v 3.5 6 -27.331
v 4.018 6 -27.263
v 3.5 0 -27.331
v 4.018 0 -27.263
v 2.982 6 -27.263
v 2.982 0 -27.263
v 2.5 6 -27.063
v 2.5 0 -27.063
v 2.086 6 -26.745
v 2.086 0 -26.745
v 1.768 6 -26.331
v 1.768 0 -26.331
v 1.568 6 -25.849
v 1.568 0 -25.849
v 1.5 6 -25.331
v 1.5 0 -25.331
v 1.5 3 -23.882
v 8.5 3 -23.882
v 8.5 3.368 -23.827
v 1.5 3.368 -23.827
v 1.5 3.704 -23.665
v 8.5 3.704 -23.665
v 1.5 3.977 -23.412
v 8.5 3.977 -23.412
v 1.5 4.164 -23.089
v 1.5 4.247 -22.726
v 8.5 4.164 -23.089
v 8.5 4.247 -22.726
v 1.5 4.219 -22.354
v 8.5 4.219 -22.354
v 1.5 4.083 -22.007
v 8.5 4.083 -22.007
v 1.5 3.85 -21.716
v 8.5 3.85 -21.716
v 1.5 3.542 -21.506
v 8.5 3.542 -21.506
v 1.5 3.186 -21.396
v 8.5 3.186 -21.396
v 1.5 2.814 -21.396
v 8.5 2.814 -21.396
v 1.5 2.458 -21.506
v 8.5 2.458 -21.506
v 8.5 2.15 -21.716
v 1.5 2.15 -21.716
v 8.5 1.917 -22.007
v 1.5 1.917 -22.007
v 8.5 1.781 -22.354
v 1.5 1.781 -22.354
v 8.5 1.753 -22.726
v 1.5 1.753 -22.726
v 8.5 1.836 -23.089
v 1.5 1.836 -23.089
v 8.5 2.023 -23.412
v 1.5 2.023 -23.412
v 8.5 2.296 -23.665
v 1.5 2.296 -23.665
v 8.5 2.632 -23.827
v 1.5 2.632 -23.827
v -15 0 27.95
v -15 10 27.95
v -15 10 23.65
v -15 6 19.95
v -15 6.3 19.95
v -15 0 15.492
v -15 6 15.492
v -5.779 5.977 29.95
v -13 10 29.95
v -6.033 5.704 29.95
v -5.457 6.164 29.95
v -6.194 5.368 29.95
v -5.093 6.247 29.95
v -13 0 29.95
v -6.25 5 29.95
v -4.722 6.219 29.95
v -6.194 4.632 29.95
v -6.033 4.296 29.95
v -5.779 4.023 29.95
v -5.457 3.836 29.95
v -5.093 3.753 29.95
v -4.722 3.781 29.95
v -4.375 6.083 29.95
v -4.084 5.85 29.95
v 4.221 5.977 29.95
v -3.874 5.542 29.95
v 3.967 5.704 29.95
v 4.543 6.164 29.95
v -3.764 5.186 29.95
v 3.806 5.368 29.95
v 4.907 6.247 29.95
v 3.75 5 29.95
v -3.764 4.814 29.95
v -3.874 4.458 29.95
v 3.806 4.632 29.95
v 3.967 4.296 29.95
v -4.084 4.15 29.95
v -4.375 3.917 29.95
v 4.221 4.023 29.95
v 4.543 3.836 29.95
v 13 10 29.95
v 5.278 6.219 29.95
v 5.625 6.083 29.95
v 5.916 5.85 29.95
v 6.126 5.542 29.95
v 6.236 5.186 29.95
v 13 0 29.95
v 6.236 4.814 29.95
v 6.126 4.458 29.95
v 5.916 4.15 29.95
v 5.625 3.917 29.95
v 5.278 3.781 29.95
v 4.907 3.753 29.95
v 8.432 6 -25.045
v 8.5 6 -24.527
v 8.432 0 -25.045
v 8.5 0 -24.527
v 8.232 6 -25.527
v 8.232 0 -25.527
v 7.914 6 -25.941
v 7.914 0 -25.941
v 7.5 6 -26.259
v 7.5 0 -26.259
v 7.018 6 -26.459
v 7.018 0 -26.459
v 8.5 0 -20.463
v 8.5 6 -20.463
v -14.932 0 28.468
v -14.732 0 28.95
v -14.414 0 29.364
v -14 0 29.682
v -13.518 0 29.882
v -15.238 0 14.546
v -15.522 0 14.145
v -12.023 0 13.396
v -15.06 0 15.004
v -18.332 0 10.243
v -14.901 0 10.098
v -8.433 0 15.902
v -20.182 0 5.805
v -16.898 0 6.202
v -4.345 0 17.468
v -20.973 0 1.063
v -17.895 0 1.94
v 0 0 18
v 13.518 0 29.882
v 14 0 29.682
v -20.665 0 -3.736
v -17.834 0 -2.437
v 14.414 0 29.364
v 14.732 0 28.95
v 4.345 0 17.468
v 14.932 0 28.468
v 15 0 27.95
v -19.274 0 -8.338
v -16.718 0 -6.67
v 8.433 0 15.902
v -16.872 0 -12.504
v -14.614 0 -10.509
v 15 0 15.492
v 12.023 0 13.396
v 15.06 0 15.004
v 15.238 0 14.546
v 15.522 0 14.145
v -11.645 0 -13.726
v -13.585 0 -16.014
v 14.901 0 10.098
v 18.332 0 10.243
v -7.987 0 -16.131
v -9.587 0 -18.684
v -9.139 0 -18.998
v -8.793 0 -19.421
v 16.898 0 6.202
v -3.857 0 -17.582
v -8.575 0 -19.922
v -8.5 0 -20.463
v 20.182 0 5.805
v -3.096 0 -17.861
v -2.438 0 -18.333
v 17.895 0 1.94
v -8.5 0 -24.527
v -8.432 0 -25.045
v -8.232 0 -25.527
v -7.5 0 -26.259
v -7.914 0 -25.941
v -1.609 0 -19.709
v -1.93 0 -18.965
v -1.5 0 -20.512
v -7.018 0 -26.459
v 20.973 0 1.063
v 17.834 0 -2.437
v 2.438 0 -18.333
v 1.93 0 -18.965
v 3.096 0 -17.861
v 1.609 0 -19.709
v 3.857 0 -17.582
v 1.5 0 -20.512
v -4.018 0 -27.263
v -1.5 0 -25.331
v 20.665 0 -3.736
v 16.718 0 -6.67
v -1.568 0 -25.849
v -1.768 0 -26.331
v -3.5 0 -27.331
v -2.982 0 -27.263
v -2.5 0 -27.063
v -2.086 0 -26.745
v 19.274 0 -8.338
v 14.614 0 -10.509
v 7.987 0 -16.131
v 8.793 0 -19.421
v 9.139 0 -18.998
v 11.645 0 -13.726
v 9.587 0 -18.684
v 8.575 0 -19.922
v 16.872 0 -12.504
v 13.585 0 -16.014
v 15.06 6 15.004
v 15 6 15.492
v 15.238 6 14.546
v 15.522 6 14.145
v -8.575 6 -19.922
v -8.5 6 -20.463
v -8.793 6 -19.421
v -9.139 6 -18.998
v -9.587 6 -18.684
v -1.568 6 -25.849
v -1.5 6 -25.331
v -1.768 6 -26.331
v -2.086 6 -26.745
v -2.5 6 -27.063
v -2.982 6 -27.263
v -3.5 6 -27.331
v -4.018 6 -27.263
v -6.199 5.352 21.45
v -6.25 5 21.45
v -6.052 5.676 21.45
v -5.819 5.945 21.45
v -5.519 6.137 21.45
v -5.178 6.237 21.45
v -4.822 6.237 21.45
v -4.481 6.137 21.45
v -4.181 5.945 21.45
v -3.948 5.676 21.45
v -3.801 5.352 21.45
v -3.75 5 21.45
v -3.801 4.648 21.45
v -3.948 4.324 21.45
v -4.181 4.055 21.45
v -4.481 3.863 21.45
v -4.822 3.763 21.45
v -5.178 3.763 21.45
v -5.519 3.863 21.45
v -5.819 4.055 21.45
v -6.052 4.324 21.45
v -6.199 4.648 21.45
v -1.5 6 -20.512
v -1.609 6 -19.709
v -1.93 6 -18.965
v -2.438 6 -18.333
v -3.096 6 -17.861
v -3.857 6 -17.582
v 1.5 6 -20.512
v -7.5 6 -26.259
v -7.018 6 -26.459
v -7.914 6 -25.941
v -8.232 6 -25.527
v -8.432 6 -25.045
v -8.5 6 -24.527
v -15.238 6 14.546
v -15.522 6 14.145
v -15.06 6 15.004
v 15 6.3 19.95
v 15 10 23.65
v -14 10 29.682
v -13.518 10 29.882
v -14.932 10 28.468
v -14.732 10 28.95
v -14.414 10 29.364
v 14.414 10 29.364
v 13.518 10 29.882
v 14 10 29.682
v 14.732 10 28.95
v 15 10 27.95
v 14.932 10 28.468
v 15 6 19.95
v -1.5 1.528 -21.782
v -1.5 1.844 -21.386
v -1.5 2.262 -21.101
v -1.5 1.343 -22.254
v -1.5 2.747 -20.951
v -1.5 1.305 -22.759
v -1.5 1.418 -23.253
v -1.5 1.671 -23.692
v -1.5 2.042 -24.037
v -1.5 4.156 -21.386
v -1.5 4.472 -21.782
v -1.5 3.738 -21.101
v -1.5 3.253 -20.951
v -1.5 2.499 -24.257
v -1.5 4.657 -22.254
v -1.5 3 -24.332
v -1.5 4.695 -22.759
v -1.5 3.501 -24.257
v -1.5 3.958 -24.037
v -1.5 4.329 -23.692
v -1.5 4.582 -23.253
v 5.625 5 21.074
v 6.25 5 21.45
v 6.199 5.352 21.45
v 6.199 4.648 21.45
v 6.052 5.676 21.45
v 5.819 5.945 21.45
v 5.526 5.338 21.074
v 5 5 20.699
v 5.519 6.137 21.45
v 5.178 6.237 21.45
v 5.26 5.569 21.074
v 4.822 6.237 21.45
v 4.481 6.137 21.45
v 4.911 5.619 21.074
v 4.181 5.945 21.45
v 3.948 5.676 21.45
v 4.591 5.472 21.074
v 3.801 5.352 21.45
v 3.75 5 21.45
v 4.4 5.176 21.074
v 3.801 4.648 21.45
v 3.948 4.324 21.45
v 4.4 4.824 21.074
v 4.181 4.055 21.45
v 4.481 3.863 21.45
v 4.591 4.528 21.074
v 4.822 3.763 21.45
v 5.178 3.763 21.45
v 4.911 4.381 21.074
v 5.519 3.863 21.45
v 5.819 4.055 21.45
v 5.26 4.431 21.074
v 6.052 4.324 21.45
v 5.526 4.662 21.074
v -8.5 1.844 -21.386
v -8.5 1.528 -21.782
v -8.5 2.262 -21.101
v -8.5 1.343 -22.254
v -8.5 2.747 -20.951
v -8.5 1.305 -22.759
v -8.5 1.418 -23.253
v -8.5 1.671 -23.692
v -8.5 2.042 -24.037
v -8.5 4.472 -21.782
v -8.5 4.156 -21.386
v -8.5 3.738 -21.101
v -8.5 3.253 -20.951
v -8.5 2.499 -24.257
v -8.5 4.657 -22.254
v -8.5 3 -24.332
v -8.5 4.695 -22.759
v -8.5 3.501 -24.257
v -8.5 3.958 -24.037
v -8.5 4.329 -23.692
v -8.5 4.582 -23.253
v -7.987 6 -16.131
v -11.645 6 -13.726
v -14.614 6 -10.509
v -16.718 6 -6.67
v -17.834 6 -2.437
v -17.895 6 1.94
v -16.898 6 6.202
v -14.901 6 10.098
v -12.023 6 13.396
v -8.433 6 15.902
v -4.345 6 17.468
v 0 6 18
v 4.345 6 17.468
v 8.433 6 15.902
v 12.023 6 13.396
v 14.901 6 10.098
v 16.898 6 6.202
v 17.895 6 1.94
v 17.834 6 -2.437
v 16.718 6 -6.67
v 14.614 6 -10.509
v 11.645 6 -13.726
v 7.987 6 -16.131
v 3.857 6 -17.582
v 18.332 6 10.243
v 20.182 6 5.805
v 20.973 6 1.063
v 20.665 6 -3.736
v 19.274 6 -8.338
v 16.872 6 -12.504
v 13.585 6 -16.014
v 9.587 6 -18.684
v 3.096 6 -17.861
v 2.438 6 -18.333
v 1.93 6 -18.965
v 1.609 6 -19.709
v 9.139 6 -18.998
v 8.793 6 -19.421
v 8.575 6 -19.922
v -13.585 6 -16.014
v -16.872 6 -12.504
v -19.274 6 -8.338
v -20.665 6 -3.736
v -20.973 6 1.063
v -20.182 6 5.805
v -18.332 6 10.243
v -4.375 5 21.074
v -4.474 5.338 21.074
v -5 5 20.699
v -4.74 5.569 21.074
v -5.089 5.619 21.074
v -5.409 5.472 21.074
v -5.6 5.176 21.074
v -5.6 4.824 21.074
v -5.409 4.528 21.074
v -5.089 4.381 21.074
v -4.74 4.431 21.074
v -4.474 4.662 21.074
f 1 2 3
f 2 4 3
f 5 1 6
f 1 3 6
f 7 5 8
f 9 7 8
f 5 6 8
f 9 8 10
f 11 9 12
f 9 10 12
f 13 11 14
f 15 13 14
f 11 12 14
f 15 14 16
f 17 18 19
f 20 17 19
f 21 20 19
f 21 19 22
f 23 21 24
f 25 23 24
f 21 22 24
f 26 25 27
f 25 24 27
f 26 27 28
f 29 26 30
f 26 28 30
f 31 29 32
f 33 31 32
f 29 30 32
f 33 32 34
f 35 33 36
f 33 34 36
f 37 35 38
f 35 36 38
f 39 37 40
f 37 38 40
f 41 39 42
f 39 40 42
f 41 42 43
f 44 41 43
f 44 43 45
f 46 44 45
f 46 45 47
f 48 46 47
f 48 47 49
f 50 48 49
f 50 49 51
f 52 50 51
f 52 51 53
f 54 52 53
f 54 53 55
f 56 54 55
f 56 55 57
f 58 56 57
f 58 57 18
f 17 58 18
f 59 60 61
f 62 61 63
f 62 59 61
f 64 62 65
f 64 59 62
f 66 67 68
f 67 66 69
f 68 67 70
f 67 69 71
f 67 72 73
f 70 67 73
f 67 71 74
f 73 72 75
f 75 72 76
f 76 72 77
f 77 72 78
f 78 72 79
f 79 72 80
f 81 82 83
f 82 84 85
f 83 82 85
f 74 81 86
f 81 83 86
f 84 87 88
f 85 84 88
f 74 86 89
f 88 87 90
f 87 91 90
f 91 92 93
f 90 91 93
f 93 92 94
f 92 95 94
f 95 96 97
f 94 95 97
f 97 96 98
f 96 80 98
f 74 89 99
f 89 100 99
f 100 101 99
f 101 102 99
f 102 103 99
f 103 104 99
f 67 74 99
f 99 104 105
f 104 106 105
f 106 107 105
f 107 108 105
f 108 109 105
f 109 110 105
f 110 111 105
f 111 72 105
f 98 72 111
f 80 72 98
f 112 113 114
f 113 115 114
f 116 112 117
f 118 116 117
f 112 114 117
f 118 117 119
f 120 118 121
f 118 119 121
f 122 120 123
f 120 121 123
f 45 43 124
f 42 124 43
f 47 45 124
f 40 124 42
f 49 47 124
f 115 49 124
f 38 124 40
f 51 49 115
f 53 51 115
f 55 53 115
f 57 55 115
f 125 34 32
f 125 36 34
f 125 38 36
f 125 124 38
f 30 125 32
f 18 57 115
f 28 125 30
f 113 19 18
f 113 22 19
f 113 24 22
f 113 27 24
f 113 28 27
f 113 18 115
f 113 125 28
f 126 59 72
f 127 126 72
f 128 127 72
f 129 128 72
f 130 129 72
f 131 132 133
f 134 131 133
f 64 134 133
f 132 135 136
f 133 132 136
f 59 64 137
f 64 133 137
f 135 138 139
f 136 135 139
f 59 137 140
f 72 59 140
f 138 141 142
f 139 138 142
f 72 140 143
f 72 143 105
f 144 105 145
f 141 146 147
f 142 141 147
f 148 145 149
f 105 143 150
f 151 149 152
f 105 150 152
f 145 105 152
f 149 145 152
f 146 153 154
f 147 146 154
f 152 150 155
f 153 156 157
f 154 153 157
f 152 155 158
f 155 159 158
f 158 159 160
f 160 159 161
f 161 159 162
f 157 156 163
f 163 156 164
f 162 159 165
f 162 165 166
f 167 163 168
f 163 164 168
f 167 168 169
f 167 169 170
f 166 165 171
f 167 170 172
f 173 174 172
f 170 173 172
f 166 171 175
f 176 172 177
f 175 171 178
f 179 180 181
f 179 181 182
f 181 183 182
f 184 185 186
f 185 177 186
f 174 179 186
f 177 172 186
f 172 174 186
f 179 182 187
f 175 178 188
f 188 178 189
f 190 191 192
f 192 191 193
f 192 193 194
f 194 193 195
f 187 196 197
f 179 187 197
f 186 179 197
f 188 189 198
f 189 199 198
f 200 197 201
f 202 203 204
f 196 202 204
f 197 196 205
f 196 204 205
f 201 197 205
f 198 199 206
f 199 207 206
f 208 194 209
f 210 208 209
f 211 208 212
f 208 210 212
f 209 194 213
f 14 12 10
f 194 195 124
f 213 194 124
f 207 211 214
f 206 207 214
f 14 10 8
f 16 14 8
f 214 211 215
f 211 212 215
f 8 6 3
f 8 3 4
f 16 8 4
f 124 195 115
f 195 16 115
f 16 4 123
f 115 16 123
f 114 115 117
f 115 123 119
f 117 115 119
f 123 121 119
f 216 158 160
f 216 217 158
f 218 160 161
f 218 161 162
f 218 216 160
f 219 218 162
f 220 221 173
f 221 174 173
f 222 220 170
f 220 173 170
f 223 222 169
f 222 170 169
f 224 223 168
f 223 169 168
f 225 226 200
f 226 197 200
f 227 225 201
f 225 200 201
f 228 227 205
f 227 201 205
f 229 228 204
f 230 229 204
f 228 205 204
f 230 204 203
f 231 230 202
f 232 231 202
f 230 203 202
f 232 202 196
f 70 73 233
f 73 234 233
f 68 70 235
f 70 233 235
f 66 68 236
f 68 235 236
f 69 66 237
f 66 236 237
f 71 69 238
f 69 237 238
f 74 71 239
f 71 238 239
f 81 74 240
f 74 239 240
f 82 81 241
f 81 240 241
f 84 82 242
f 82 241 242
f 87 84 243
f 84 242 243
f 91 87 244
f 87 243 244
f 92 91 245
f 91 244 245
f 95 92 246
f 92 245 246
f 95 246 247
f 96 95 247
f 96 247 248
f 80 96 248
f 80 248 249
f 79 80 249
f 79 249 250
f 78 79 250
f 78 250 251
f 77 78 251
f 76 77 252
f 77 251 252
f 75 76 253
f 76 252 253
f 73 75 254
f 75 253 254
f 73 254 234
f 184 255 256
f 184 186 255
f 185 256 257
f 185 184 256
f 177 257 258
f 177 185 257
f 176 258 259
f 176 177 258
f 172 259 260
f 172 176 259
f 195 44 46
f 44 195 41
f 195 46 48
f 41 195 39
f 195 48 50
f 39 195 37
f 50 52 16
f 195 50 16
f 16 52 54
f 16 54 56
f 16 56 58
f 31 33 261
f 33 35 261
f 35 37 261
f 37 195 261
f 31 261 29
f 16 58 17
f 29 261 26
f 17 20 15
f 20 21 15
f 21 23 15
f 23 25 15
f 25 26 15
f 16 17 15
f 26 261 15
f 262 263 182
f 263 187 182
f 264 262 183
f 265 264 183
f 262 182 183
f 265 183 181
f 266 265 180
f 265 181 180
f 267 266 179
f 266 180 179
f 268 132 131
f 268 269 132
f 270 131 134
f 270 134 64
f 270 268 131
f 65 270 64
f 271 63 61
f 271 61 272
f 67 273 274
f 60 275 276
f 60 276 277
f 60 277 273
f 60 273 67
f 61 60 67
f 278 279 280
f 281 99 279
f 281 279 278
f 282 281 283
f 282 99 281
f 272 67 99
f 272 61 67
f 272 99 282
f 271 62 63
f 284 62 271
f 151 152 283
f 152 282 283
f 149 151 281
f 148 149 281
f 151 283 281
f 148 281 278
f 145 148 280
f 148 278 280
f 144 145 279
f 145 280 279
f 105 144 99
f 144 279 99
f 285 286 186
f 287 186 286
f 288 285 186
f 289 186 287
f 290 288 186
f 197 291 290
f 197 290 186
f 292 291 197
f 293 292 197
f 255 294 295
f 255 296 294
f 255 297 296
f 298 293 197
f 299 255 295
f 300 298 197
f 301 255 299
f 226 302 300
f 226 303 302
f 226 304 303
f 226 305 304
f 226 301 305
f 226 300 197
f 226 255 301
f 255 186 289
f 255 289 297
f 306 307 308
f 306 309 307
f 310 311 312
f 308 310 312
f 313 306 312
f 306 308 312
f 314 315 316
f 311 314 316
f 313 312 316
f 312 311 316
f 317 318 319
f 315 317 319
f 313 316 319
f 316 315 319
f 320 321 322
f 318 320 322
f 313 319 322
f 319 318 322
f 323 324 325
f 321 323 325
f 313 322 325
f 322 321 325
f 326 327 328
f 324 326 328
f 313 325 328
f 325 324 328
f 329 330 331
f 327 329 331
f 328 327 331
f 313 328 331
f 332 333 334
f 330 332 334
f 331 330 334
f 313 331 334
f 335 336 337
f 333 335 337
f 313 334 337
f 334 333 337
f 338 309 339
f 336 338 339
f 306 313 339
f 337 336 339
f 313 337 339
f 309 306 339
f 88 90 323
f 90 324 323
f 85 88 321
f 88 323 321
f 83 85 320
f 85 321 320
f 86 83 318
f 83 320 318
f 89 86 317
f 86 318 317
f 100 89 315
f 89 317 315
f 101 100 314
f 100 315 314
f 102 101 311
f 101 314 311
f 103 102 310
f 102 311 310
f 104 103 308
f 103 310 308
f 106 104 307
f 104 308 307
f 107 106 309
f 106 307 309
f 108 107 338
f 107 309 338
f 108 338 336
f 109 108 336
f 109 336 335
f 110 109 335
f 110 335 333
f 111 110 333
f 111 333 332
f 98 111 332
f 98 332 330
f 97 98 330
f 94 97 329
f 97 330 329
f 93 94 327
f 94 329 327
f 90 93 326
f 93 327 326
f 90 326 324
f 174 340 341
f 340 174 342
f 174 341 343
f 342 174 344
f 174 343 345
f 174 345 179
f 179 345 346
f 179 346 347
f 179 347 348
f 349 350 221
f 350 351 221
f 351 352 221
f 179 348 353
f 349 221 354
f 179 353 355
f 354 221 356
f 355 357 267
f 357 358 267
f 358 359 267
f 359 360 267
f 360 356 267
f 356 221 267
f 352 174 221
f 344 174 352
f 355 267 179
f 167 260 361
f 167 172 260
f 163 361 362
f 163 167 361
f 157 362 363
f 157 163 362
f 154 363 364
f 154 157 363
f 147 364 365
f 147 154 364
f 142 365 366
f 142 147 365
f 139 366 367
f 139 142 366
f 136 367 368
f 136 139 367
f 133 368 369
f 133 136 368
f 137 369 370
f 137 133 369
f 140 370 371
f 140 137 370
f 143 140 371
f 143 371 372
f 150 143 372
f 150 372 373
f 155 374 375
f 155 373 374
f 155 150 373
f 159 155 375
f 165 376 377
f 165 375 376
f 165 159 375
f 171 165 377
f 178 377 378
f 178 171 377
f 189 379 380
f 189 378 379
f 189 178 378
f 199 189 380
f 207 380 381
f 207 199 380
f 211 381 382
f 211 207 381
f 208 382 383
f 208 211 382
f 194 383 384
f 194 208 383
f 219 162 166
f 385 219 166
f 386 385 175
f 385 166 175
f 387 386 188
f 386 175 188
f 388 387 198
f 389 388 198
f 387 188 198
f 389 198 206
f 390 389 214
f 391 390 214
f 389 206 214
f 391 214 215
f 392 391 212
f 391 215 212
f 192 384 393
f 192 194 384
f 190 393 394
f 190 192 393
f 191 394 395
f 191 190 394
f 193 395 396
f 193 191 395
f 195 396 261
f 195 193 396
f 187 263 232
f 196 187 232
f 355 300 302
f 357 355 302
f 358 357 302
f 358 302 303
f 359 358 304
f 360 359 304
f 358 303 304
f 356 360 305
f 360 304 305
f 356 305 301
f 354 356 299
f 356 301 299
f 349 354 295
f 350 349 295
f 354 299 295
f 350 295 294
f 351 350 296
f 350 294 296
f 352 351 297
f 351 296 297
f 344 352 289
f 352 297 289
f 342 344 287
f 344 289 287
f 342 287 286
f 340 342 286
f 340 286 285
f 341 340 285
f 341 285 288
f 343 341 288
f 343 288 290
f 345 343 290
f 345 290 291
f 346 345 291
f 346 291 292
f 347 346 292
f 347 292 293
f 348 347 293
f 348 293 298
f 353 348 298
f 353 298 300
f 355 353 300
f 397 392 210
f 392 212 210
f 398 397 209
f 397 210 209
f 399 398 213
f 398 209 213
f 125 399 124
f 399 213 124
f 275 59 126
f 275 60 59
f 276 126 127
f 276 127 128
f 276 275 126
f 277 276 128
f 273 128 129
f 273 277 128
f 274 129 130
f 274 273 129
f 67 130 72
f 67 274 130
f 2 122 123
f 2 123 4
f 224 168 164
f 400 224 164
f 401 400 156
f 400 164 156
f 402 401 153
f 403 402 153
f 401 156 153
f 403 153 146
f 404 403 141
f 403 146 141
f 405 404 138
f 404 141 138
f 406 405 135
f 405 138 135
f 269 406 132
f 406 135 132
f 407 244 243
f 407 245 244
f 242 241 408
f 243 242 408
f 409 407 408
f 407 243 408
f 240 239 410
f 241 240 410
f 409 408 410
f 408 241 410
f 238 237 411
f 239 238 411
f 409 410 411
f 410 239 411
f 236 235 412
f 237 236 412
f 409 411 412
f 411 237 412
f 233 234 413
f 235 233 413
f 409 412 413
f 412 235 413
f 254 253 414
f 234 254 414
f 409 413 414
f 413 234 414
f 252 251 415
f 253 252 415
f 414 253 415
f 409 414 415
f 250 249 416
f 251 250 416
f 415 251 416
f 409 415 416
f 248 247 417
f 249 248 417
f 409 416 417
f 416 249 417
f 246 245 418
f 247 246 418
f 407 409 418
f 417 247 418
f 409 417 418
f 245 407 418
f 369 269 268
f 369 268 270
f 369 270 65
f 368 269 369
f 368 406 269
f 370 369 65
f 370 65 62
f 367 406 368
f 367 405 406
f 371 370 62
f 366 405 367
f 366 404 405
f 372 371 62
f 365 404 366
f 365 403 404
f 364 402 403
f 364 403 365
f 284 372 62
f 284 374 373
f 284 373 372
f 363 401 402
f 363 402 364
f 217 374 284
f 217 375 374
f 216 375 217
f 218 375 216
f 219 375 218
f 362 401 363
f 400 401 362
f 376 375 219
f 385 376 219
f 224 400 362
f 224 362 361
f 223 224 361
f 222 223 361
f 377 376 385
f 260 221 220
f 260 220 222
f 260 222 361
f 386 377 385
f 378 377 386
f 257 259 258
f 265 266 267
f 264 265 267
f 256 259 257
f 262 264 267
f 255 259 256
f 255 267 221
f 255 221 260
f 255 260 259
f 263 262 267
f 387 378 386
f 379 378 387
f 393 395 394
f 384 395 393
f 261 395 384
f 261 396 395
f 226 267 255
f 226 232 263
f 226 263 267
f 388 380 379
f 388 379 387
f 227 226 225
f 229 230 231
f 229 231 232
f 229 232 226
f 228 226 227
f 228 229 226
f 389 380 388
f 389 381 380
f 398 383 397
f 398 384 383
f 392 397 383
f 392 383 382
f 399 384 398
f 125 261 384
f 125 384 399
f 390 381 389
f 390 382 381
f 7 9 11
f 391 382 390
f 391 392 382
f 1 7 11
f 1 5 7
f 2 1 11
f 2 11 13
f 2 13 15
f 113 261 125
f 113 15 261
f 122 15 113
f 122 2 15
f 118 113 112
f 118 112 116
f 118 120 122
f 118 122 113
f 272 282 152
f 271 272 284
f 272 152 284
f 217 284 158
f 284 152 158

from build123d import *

# Parameters (mm, degrees)
SKETCH_1_R            = 18
EXTRUDE_1_DEPTH       = 6
SKETCH_4_W            = 3
SKETCH_4_H            = 5
CUT_EXTRUDE_2_DEPTH   = 6
SKETCH_20_W           = 30
SKETCH_20_H           = 10
EXTRUDE_6_DEPTH       = 4
EXTRUDE_5_DEPTH       = 6
HOLE_WIZARD_M32_D     = 3.4
HOLE_WIZARD_M32_DEPTH = 7
M3X0_51_D             = 2.5
M3X0_52_D             = 2.5
M3X0_52_DEPTH         = 8.5
M3X0_52_TIP           = 0.751075774
FILLET_1_R            = 2
FILLET_2_R            = 3
CHAMFER_1_SIZE        = 3.7


with BuildPart() as part:
    # Эскиз1 → Бобышка-Вытянуть1 (new body)
    with BuildSketch(Plane(origin=(0, 0, 0), x_dir=(1, 0, 0), z_dir=(0, 1, 0))):
        with BuildLine():
            Line((-15, -14.696938457), (-15, -29.949874371))
            Line((-15, -29.949874371), (15, -29.949874371))
            Line((15, -29.949874371), (15, -14.696938457))
            ThreePointArc((15, -14.696938457), (0, 21), (-15, -14.696938457))
        make_face()
        with Locations(Location((0, 0, 0), (0, 0, 270))):
            Circle(SKETCH_1_R, mode=Mode.SUBTRACT)
    extrude(amount=EXTRUDE_1_DEPTH)

    # Эскиз4 → Вырез-Вытянуть2 (cut)
    with BuildSketch(Plane(origin=(0, 6, 0), x_dir=(1, 0, 0), z_dir=(0, 1, 0))):
        with Locations((0, 18.5)):
            Rectangle(SKETCH_4_W, SKETCH_4_H)
    extrude(amount=-CUT_EXTRUDE_2_DEPTH, mode=Mode.SUBTRACT)

    # Эскиз20 → Бобышка-Вытянуть6 (add)
    with BuildSketch(Plane(origin=(0, 6, 0), x_dir=(1, 0, 0), z_dir=(0, 1, 0))):
        with Locations((0, -24.949874371)):
            Rectangle(SKETCH_20_W, SKETCH_20_H)
    extrude(amount=EXTRUDE_6_DEPTH)

    # Эскиз11 → Бобышка-Вытянуть5 (add)
    with BuildSketch(Plane(origin=(0, 6, 0), x_dir=(1, 0, 0), z_dir=(0, 1, 0))):
        Polygon((-1.5, 17.937391115), (-8.5, 17.937391115), (-8.5, 26.061746768), (-1.5, 27.937391115), align=None)
        Polygon((8.5, 17.937391115), (8.5, 26.061746768), (1.5, 27.937391115), (1.5, 17.937391115), align=None)
    extrude(amount=-EXTRUDE_5_DEPTH)

    # Отверстие с зазором M32
    with Locations(Plane.ZY.offset(8.5)):
        with Locations((-22.632305569, 3)):
            Hole(HOLE_WIZARD_M32_D / 2, depth=HOLE_WIZARD_M32_DEPTH)

    # Отверстие обработанное метчиком M3x0.51 (through all)
    with Locations(Plane(origin=(1.5, -0.91070238, -4.39340032), x_dir=(0, 0, 1), z_dir=(-1, 0, 0))):
        with Locations((-18.238905249, 3.91070238)):
            Hole(M3X0_51_D / 2)

    # Отверстие обработанное метчиком M3x0.52
    with Locations(Plane.XY.offset(29.949874371)):
        with Locations((-5, 5), (5, 5)):
            Hole(M3X0_52_D / 2, depth=M3X0_52_DEPTH)
            with Locations((0, 0, -(M3X0_52_DEPTH + M3X0_52_TIP / 2))):  # 118° drill point
                Cone(0, M3X0_52_D / 2, M3X0_52_TIP, mode=Mode.SUBTRACT)

    # Скругление1
    fillet_1_edges = [part.edges().sort_by_distance(p)[0] for p in [
        (15, 3, 14.696938457),
        (-8.5, 3, -19.20286437),
        (8.5, 3, -19.20286437),
        (15, 5, 29.949874371),
        (-15, 5, 29.949874371),
        (-15, 3, 14.696938457),
        (8.5, 3, -26.061746768),
        (1.5, 3, -27.937391115),
        (-1.5, 3, -27.937391115),
        (-8.5, 3, -26.061746768),
    ]]
    fillet(fillet_1_edges, radius=FILLET_1_R)

    # Скругление2
    fillet_2_edges = [part.edges().sort_by_distance(p)[0] for p in [
        (-1.5, 3, -17.937391115),
        (1.5, 3, -17.937391115),
    ]]
    fillet(fillet_2_edges, radius=FILLET_2_R)

    # Фаска1
    chamfer_1_edges = [part.edges().sort_by_distance(p)[0] for p in [
        (0, 10, 19.949874371),
    ]]
    chamfer(chamfer_1_edges, length=CHAMFER_1_SIZE)


solid = part.part
